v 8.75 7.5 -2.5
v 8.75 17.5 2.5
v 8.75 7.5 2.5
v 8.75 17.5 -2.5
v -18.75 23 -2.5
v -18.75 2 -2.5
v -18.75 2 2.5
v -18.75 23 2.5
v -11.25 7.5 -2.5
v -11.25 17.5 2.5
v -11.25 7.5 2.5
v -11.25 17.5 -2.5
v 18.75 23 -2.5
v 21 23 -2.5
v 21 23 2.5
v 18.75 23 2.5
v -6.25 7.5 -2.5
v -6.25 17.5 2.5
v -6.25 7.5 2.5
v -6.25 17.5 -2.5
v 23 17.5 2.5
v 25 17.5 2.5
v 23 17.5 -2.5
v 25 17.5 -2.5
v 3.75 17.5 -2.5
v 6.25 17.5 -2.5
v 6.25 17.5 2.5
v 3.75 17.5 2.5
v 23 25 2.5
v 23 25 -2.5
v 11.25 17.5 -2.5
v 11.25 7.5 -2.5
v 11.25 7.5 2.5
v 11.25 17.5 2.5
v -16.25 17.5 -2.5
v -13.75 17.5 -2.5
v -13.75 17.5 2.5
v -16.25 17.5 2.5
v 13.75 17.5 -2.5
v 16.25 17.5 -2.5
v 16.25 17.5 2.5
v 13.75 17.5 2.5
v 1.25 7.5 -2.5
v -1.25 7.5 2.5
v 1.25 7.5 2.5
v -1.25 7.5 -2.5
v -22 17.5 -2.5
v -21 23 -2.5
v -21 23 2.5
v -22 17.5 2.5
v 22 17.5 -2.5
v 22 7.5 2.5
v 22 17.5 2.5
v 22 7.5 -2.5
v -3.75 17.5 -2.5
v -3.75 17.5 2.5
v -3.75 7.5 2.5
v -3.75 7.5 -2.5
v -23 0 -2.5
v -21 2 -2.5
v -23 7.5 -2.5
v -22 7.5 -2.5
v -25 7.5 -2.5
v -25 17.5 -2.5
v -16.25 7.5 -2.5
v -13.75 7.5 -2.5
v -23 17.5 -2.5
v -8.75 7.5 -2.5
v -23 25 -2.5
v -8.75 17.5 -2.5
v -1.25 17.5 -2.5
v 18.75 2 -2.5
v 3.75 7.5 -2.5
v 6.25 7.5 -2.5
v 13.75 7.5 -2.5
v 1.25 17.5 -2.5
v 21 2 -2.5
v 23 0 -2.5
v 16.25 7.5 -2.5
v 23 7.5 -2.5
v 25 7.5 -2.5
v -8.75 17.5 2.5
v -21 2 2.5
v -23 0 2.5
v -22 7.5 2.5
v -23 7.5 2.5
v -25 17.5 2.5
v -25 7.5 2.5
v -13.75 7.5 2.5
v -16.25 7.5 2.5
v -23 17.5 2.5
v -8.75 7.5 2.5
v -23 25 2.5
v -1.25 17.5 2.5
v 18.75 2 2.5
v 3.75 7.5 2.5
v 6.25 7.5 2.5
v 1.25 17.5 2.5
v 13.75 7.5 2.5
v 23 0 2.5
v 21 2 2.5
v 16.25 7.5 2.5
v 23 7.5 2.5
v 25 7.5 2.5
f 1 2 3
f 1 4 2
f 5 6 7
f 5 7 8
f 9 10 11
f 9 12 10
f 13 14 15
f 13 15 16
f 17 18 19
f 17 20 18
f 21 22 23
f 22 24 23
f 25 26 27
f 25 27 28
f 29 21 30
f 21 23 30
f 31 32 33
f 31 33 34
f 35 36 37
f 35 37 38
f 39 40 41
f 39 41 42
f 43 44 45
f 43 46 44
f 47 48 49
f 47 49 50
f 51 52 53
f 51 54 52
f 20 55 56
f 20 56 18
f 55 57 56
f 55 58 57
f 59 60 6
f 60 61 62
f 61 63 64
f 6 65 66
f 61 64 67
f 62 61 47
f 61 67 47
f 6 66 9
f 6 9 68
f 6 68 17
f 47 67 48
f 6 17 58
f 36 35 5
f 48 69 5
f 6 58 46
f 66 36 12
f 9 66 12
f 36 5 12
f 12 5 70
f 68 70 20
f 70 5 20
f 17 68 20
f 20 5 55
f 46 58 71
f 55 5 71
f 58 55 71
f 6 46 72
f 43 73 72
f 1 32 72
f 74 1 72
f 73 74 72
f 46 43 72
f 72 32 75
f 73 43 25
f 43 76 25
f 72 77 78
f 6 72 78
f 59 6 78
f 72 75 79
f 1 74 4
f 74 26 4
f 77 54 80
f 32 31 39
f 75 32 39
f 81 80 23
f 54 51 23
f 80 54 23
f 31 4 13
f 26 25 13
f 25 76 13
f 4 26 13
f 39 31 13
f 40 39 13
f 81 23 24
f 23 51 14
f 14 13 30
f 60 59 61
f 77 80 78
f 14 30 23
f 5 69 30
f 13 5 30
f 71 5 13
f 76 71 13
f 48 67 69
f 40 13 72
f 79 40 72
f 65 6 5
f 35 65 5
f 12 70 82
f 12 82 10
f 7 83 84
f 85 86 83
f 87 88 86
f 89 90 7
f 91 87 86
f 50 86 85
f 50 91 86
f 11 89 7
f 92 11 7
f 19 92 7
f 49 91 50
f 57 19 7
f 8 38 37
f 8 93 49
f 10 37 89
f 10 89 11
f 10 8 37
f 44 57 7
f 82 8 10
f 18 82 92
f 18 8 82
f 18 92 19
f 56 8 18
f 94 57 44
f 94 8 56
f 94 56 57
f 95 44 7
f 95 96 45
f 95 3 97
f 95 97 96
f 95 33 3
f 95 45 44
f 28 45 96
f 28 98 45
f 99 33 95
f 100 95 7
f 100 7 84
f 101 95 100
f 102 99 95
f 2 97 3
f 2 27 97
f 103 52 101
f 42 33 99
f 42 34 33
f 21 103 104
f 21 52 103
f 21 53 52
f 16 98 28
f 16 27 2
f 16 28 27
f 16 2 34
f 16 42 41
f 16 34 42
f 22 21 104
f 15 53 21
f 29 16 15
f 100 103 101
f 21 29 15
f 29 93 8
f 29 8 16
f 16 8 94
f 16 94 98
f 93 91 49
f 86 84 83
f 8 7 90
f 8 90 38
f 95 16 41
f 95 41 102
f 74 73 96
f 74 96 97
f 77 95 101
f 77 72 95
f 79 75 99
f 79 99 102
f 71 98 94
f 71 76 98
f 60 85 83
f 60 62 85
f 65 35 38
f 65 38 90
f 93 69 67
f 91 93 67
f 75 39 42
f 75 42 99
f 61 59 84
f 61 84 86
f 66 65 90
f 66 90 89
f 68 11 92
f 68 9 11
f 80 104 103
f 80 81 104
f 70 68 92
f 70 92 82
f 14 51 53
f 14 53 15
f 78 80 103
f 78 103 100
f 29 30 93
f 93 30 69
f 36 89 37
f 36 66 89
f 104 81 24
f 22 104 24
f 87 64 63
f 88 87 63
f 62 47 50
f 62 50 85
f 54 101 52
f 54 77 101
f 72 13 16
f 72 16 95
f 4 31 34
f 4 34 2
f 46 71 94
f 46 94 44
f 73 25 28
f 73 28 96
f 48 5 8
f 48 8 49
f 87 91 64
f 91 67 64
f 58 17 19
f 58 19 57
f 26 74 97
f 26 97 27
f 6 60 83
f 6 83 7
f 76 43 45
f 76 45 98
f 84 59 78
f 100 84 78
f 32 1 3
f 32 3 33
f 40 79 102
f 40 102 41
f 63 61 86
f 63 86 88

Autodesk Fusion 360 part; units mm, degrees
sketch "Sketch1" plane through (0, 0, 0) normal (0, 0, 1) x (1, 0, 0)
  line L0 (23, 25) -> (0, 25)
  line L1 (0, 25) -> (0, 0)
  line L2 (0, 0) -> (23, 0)
  line L3 (25, 7.5) -> (25, 17.5)
  line L4 (25, 12.5) -> (0, 12.5) construction
  line L5 (25, 7.5) -> (23, 7.5)
  line L6 (23, 7.5) -> (23, 0)
  line L7 (25, 17.5) -> (23, 17.5)
  line L8 (23, 17.5) -> (23, 25)
  line L9 (21, 23) -> (18.75, 23)
  line L10 (18.75, 23) -> (18.75, 2)
  line L11 (18.75, 2) -> (21, 2)
  line L12 (21, 2) -> (22, 7.5)
  line L13 (22, 17.5) -> (21, 23)
  line L14 (16.25, 17.5) -> (13.75, 17.5)
  line L15 (13.75, 17.5) -> (13.75, 7.5)
  line L16 (13.75, 7.5) -> (16.25, 7.5)
  line L17 (16.25, 7.5) -> (16.25, 17.5)
  line L18 (22, 7.5) -> (22, 17.5)
  point P0 (25, 12.5)
  point P1 (18.75, 12.5)
  point P2 (16.25, 12.5)
  point P3 (22, 12.5)
  dimension "d6" = 2
  dimension "d7" = 1
  dimension "d8" = 2
  dimension "d9" = 10
  dimension "d10" = 25
  dimension "d11" = 2
  dimension "d13" = 2.5
  dimension "d14" = 2.5
  dimension "d24" = 23
  dimension "d25" = 10
  dimension "d26" = 6.25
extrude "Extrude1" add sketch "Sketch1" along normal mid plane 5 contours L0 L1 L2 L3 L5 L6 L7 L8 | L14 L15 L16 L17
extrude "Extrude2" cut sketch "Sketch1" along normal through all and the other way through all contours L14 L15 L16 L17
pattern_linear "R-Pattern1" count 11 spacing 5 along (-1, 0, 0) of "Extrude2"
mirror "Mirror1" about plane through (0, 25, 0) normal (-1, 0, 0) of bodies 1 merged
equation "unit_size = 25 mm"
equation "wall_thickness = 2 mm"
equation "column_units = 2"
equation "d6 = wall_thickness"
equation "d24 = unit_size * column_units / 2 - wall_thickness"
equation "d25 = 2 * unit_size / 5"
